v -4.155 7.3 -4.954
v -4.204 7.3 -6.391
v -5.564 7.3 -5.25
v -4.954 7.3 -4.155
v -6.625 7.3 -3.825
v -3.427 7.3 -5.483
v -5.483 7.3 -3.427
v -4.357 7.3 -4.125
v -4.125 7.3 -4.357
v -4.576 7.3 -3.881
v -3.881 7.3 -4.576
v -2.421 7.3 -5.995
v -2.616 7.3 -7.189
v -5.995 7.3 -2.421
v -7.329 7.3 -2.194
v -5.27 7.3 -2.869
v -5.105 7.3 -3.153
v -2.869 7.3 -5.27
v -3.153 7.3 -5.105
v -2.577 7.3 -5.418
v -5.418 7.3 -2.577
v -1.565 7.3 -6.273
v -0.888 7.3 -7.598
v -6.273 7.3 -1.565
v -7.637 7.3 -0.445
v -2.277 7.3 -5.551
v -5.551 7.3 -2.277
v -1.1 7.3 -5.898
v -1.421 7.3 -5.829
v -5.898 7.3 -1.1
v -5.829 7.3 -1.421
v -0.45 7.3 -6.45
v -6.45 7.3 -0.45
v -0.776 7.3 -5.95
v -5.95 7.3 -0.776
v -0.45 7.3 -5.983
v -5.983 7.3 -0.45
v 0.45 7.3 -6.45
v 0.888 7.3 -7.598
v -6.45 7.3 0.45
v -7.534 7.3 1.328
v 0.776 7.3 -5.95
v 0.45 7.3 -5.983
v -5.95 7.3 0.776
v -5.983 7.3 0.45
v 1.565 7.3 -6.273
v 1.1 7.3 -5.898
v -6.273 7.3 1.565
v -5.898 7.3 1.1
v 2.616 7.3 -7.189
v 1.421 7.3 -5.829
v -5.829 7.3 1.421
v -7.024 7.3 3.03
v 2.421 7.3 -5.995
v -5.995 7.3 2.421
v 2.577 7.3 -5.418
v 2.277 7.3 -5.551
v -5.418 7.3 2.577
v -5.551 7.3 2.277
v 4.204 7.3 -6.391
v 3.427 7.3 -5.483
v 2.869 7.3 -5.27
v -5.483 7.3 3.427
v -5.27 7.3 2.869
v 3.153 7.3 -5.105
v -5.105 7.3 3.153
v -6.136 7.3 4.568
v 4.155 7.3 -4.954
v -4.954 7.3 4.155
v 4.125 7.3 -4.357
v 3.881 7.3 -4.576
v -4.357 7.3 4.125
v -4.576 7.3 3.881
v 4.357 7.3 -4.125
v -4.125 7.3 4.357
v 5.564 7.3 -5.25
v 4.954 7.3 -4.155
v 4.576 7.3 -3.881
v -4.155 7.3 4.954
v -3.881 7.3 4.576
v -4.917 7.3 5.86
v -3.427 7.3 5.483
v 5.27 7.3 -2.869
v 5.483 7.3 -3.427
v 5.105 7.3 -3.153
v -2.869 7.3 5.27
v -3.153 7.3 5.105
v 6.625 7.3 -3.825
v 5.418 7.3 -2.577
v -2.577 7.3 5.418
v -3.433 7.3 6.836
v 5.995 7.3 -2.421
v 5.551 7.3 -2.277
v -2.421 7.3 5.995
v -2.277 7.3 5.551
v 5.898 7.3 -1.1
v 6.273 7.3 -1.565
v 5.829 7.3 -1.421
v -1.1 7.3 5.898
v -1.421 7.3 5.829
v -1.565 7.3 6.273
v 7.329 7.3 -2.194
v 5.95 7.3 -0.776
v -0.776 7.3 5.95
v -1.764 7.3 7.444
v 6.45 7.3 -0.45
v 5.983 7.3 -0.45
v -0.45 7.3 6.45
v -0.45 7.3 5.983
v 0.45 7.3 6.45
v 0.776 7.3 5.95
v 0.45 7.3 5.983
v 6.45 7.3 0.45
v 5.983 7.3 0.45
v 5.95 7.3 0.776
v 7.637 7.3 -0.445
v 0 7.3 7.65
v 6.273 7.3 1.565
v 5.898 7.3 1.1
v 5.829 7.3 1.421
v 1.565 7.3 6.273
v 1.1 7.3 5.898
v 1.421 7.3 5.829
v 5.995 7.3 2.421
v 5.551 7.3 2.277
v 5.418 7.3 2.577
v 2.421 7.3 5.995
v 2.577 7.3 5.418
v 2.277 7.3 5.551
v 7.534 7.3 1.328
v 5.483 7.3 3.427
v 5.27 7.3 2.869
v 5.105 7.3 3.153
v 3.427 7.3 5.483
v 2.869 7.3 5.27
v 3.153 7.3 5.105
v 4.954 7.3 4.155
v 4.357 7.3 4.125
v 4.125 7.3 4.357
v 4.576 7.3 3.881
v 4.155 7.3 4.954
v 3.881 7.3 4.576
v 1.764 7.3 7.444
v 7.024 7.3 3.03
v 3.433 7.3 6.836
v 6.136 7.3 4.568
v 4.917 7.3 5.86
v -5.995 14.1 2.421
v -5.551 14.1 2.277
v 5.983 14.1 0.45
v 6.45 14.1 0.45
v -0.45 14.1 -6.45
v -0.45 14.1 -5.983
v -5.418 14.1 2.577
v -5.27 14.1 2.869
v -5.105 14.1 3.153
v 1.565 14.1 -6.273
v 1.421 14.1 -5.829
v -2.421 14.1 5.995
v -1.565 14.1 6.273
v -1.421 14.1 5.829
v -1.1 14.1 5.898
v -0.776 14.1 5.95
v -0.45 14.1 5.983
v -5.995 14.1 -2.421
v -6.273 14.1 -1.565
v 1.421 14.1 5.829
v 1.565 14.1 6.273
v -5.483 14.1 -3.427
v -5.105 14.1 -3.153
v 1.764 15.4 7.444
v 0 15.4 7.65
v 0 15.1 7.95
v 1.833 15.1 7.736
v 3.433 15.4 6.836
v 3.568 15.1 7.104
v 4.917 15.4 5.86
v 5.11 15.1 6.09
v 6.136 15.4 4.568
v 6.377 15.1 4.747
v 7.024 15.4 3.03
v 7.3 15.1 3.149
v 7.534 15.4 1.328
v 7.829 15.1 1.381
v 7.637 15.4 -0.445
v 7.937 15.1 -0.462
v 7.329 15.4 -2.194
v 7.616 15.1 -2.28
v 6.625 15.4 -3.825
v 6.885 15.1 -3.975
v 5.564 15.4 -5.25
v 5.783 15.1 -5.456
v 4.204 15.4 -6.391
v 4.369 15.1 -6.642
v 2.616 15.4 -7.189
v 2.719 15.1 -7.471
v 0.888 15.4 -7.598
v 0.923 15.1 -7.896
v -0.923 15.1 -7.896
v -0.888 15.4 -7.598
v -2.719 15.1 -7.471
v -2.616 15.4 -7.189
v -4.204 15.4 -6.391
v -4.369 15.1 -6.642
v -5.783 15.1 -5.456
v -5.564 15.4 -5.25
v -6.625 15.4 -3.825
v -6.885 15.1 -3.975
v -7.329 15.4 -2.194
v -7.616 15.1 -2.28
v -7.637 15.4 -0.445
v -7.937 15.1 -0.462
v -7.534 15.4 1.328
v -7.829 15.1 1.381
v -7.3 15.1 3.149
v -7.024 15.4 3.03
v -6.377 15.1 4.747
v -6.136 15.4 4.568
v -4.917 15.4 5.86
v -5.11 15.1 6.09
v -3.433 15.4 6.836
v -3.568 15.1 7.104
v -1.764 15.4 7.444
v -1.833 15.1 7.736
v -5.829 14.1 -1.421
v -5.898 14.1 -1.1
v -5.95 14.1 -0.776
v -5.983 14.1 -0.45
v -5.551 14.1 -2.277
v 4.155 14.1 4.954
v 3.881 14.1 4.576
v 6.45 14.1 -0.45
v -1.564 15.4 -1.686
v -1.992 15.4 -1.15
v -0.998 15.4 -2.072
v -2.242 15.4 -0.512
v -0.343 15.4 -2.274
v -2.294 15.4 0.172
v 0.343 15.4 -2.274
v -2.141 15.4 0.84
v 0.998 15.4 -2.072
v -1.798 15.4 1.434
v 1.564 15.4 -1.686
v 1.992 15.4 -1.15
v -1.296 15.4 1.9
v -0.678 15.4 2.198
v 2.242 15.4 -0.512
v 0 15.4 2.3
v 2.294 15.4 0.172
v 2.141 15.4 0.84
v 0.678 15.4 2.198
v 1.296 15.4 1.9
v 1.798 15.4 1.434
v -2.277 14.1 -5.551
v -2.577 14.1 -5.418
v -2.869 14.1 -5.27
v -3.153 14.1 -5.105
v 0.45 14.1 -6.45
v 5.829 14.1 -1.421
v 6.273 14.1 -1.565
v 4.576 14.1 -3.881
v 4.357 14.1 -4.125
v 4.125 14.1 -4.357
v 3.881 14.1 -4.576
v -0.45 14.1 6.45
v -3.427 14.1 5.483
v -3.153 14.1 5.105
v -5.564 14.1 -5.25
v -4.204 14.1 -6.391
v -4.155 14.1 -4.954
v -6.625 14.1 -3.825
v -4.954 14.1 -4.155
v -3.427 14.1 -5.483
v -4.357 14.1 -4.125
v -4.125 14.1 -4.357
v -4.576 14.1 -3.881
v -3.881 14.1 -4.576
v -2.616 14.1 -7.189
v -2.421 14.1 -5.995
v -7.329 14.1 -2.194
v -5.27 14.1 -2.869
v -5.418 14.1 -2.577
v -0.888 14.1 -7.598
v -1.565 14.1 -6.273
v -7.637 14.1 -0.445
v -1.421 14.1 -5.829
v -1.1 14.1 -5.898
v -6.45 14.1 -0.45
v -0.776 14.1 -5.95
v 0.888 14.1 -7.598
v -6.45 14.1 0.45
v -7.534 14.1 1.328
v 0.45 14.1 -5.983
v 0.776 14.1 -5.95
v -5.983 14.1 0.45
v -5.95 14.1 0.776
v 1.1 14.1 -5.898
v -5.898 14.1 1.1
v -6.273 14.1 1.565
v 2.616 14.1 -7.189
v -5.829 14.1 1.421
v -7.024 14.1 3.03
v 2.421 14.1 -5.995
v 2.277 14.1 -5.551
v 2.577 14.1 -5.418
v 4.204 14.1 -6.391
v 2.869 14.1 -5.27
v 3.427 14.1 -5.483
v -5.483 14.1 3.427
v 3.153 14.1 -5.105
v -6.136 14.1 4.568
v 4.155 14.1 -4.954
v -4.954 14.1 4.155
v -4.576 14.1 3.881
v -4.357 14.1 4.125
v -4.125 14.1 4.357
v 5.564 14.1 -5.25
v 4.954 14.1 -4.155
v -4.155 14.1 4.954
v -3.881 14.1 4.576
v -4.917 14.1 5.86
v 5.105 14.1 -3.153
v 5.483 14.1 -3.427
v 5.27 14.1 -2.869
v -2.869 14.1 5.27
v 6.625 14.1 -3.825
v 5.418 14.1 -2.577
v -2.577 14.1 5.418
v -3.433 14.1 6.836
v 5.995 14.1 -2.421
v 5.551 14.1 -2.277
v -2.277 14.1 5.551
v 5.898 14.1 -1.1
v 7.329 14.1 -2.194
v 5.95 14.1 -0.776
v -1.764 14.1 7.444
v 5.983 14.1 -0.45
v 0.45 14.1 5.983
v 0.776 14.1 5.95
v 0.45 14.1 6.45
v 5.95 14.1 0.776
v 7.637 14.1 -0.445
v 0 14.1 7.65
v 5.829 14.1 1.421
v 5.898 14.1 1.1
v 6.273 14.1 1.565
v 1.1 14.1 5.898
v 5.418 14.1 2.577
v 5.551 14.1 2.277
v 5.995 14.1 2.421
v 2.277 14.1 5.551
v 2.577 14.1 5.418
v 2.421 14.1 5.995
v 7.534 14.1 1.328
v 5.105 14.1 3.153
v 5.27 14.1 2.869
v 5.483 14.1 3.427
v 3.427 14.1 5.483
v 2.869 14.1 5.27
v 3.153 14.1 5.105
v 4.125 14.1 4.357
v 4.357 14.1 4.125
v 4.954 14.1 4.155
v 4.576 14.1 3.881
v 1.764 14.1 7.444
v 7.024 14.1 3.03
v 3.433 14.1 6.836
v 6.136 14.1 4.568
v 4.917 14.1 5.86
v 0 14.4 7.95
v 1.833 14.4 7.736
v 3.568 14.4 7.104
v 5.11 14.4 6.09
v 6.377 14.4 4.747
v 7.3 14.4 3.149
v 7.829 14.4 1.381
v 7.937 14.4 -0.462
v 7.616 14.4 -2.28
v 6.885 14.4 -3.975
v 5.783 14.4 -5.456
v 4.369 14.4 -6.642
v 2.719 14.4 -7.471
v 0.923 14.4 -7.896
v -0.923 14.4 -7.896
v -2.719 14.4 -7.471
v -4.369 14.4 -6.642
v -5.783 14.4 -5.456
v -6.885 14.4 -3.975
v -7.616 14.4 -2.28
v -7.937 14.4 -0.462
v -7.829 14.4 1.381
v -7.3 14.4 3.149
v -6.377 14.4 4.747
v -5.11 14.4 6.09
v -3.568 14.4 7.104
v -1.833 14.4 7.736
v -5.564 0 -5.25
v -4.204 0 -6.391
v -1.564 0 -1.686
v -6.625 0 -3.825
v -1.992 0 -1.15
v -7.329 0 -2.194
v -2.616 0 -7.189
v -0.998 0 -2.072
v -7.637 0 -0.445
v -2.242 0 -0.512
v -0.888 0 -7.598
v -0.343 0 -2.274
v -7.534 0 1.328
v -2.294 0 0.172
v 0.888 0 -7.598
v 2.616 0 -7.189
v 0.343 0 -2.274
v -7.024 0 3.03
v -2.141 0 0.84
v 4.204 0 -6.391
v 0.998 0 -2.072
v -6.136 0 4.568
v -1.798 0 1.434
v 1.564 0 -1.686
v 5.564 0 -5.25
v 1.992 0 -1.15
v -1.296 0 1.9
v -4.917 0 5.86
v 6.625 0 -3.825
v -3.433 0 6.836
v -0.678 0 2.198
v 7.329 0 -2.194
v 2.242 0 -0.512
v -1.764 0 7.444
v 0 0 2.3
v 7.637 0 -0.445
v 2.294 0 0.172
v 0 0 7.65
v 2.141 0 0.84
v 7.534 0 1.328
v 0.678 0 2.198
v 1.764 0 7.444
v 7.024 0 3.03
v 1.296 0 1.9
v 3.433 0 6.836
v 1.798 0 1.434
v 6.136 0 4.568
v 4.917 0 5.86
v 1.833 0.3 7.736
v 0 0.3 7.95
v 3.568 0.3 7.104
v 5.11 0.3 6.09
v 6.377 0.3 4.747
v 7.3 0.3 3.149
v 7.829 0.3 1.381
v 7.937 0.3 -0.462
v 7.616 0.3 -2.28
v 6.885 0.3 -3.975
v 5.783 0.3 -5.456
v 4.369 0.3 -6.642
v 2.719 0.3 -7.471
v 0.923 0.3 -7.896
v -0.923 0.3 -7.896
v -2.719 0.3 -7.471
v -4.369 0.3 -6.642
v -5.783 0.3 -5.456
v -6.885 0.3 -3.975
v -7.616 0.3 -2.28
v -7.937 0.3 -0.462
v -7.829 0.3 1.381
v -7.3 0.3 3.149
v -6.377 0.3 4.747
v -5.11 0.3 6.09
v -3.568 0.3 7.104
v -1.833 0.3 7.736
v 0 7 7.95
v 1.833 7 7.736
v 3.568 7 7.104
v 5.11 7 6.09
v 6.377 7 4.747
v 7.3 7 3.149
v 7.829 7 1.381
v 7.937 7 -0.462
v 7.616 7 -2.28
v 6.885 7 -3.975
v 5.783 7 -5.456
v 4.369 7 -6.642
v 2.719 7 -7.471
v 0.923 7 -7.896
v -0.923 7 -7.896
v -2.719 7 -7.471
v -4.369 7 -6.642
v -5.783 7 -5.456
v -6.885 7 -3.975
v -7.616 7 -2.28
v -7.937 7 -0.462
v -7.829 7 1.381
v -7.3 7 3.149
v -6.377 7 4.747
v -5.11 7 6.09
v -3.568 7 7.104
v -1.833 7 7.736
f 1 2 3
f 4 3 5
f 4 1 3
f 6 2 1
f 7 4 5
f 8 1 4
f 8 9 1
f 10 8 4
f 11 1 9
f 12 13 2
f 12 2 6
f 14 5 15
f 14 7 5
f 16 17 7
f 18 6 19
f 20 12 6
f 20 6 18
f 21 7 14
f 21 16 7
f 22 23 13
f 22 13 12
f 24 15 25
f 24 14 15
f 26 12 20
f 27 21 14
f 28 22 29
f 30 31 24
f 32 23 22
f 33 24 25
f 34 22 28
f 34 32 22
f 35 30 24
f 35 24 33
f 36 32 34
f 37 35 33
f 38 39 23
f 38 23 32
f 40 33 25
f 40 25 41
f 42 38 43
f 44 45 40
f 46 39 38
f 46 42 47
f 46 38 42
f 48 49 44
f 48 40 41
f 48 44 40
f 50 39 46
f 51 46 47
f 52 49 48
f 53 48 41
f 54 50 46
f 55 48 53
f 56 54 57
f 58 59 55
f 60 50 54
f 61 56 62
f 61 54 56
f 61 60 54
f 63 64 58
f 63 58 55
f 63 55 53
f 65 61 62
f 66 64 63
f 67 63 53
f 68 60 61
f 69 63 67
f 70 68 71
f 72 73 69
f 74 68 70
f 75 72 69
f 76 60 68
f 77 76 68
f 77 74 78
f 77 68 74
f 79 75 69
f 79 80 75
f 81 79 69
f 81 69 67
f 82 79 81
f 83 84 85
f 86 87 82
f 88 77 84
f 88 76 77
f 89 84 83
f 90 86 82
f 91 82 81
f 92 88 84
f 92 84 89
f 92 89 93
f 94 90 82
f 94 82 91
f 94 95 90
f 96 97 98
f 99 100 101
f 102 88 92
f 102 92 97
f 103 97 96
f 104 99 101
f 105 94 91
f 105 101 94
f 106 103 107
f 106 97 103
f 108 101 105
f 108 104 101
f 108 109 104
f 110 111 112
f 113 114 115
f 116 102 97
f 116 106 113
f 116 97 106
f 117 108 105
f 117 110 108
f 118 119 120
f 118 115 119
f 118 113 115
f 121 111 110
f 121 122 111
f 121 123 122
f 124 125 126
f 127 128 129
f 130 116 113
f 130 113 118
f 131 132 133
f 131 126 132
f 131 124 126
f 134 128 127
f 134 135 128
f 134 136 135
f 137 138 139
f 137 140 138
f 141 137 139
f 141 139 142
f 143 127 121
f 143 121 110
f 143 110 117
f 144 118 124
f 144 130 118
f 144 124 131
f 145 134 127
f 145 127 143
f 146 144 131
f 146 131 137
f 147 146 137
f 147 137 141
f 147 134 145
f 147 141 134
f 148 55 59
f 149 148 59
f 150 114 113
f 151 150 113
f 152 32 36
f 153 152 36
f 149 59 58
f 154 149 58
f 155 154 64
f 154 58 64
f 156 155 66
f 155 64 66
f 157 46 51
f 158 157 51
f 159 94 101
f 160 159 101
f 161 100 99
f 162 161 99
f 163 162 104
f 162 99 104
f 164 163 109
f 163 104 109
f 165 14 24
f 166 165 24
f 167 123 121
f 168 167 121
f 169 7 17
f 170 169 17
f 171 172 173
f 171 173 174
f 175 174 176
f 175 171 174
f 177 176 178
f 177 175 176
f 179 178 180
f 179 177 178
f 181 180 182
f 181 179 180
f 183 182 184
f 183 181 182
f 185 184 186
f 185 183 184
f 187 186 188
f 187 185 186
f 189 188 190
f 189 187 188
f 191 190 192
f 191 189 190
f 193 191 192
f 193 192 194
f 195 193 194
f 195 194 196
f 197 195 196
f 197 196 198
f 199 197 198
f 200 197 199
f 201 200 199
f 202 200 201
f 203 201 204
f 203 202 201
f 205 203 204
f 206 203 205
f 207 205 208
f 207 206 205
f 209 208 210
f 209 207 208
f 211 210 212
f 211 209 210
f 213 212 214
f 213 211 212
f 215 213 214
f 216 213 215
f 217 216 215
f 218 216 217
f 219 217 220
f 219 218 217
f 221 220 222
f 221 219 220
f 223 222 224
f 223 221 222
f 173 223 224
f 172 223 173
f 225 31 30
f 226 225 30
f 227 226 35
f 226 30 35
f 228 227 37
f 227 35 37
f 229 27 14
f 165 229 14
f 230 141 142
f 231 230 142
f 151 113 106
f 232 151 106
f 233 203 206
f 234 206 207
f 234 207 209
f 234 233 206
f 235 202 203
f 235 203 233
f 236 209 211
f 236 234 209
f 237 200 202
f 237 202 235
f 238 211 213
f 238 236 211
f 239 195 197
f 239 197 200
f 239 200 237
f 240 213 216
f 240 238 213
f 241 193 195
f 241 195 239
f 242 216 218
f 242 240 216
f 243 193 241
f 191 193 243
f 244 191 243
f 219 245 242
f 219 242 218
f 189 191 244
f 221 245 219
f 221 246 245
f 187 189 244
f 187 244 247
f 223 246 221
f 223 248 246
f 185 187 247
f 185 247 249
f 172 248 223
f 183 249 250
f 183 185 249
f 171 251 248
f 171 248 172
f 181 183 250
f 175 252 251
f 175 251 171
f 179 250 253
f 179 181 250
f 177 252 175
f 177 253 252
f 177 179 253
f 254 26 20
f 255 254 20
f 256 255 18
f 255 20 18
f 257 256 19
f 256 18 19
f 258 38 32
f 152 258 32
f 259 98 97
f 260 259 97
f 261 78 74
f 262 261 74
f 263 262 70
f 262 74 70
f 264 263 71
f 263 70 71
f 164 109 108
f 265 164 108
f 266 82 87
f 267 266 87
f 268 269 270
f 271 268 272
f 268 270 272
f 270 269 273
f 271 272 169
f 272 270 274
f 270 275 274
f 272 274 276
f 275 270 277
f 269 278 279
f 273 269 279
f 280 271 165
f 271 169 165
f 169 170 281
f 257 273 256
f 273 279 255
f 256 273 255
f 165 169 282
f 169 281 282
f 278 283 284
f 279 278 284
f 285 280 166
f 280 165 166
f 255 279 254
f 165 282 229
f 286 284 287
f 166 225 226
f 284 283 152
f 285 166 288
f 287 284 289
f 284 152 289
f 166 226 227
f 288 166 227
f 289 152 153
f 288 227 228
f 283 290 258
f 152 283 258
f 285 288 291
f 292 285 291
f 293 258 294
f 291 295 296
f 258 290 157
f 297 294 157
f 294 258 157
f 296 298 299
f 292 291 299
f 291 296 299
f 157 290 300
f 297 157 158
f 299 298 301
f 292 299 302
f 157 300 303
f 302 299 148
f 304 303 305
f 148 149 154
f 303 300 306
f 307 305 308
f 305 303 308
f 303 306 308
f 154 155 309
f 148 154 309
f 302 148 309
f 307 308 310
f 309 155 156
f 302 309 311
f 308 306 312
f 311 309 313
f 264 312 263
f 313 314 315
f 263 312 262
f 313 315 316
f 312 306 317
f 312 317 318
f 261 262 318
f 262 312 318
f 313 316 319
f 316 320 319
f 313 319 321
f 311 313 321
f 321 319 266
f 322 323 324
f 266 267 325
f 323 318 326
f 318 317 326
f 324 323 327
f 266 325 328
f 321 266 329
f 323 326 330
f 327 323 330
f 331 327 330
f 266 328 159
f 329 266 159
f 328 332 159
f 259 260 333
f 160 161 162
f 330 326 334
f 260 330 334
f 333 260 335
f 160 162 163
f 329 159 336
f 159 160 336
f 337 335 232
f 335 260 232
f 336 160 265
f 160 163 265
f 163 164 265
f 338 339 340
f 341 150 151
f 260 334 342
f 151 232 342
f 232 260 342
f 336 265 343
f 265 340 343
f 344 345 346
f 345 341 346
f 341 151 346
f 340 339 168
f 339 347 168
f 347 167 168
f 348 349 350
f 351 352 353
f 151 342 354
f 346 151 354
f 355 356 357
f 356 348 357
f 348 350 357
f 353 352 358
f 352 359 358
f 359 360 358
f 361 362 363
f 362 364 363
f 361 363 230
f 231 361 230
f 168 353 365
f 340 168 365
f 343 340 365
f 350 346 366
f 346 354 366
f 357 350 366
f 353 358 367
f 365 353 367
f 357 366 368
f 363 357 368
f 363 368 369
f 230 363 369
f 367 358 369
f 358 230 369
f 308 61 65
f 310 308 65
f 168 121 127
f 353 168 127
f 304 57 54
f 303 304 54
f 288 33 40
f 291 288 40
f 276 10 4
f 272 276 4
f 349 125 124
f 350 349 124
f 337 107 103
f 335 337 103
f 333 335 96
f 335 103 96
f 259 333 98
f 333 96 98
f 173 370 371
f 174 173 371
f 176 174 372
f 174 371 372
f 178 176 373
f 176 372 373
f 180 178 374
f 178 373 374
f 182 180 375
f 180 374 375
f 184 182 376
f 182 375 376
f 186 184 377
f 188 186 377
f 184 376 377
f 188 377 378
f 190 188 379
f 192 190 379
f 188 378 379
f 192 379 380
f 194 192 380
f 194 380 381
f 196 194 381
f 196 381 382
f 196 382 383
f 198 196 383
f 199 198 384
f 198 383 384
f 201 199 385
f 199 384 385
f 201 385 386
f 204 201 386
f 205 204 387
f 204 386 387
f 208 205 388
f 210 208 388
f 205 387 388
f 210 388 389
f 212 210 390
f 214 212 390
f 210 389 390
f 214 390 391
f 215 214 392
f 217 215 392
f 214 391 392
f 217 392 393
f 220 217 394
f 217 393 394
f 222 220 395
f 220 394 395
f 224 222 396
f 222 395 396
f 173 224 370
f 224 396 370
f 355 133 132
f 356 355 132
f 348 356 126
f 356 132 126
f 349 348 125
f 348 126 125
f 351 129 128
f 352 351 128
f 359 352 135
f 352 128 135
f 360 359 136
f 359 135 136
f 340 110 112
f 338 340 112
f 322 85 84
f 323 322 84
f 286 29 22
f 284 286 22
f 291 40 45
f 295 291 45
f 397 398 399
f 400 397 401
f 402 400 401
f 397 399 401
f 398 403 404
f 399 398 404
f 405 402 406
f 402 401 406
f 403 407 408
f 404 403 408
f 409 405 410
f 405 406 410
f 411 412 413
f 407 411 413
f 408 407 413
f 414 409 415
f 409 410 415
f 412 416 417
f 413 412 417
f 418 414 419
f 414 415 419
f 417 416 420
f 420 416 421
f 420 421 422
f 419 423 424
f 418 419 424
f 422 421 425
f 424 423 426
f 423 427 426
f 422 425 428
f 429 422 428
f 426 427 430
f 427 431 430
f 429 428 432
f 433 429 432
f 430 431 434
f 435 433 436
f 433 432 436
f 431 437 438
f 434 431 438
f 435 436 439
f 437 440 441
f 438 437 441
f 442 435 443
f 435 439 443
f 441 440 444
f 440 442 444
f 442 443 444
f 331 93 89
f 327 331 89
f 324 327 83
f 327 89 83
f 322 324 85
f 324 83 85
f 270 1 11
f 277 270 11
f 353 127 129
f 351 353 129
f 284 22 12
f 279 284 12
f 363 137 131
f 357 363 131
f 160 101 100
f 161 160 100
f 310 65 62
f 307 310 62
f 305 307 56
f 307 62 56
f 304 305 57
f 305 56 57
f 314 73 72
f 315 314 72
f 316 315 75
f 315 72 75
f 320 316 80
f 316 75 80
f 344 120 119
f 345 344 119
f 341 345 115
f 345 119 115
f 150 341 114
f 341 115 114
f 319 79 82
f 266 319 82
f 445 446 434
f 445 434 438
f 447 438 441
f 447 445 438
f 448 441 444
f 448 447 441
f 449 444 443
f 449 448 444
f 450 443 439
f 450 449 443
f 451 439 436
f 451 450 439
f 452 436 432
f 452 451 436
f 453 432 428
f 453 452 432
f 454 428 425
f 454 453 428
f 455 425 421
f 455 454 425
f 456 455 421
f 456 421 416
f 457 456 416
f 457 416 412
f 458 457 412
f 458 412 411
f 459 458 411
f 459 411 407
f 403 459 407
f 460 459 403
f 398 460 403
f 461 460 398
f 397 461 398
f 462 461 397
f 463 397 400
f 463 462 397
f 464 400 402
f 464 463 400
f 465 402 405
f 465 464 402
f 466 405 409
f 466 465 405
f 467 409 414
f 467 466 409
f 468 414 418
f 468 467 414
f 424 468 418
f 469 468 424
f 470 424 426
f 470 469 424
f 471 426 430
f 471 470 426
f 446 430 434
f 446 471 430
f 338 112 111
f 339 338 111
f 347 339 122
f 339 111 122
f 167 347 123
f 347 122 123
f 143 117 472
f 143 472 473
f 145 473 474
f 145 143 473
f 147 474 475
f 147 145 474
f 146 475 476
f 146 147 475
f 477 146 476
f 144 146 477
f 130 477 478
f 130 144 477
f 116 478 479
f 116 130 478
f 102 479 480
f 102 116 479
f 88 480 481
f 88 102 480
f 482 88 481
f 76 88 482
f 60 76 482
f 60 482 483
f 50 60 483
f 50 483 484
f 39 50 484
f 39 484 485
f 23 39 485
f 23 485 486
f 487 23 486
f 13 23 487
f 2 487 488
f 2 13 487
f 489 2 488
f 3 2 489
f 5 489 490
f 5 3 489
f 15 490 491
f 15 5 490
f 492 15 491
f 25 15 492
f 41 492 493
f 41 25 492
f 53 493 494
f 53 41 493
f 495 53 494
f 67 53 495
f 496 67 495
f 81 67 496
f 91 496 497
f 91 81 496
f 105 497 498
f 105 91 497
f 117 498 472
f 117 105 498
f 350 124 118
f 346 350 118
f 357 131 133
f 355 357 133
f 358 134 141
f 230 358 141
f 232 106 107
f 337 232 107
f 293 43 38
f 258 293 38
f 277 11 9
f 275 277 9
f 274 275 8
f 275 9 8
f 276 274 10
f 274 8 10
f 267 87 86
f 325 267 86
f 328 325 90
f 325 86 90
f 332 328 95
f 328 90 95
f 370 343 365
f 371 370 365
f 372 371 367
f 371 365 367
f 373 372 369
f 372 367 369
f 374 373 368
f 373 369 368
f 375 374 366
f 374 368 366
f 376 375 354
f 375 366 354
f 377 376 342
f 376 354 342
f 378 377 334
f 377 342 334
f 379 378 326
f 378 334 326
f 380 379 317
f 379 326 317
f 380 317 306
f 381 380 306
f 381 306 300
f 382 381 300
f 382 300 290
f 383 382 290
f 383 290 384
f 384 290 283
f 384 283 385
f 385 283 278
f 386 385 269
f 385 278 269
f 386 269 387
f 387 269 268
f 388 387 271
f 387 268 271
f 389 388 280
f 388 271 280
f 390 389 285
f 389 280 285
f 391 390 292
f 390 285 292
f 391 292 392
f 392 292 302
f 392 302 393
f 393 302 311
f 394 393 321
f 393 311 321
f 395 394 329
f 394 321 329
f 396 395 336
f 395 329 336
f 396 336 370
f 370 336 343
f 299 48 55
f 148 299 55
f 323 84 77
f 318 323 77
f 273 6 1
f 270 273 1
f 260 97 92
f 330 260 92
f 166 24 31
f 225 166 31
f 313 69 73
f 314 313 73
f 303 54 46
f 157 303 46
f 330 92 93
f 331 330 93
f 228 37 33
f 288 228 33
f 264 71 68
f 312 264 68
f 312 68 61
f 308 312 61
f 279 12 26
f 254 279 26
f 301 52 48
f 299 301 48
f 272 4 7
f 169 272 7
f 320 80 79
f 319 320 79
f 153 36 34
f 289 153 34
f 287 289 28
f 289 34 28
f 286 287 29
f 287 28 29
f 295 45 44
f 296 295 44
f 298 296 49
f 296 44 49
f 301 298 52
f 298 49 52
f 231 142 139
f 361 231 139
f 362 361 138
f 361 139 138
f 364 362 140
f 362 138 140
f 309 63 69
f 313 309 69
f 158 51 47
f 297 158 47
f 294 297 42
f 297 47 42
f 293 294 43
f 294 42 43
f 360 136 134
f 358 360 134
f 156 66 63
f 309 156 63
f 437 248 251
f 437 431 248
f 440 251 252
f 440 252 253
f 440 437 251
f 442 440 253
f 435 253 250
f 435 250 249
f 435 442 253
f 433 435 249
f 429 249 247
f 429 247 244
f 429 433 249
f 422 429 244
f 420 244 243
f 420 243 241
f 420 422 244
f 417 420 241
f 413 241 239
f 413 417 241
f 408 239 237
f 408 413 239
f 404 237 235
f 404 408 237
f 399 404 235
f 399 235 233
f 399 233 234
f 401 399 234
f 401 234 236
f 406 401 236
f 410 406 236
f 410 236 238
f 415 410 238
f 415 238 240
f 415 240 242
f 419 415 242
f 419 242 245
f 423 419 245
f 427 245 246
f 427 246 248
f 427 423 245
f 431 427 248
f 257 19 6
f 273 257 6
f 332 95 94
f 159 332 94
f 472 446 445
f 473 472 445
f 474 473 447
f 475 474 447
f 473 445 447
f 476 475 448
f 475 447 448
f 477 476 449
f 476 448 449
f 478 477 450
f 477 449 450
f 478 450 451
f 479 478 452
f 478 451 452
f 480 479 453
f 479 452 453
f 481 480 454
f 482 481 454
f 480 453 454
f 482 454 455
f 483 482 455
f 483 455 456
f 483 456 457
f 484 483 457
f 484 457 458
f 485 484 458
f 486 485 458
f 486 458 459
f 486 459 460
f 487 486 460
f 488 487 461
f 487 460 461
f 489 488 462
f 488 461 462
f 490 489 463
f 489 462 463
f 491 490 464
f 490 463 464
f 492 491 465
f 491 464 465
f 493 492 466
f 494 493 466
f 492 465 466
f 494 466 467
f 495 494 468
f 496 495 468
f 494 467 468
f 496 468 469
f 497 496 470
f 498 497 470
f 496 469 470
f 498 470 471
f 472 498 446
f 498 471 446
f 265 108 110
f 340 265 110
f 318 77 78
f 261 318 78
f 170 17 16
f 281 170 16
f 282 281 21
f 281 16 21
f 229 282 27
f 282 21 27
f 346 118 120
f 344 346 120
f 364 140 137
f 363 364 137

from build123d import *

# Parameters (mm, degrees)
SKETCH1_R           = 7.95
SKETCH1_R_2         = 2.3
BOSS_EXTRUDE1_DEPTH = 7.3
SKETCH2_R           = 2.3
BOSS_EXTRUDE2_DEPTH = 6.8
SKETCH3_R           = 7.95
SKETCH3_R_2         = 2.3
BOSS_EXTRUDE3_DEPTH = 1.3
CHAMFER1_SIZE       = 0.3


with BuildPart() as part:
    # Sketch1 → Boss-Extrude1 (new body)
    with BuildSketch(Plane(origin=(0, 0, 0), x_dir=(1, 0, 0), z_dir=(0, 1, 0))):
        with Locations(Location((0, 0, 0), (0, 0, 270))):
            Circle(SKETCH1_R)
        with Locations(Location((0, 0, 0), (0, 0, 270))):
            Circle(SKETCH1_R_2, mode=Mode.SUBTRACT)
    extrude(amount=BOSS_EXTRUDE1_DEPTH)

    # Sketch2 → Boss-Extrude2 (add)
    with BuildSketch(Plane(origin=(0, 7.3, 0), x_dir=(1, 0, 0), z_dir=(0, 1, 0))):
        with BuildLine():
            Line((1.565184181, 6.273372178), (1.420904518, 5.829325034))
            ThreePointArc((1.420904518, 5.829325034), (0.93860679, 5.926130044), (0.45, 5.983101203))
            Line((0.45, 5.983101203), (0.45, 6.45))
            Line((0.45, 6.45), (-0.45, 6.45))
            Line((-0.45, 6.45), (-0.45, 5.983101203))
            ThreePointArc((-0.45, 5.983101203), (-0.93860679, 5.926130044), (-1.420904518, 5.829325034))
            Line((-1.420904518, 5.829325034), (-1.565184181, 6.273372178))
            Line((-1.565184181, 6.273372178), (-2.421135046, 5.995256883))
            Line((-2.421135046, 5.995256883), (-2.276855383, 5.551209739))
            ThreePointArc((-2.276855383, 5.551209739), (-2.723942998, 5.346039145), (-3.152721002, 5.104933915))
            Line((-3.152721002, 5.104933915), (-3.42715723, 5.482662977))
            Line((-3.42715723, 5.482662977), (-4.155272525, 4.95365625))
            Line((-4.155272525, 4.95365625), (-3.880836297, 4.575927188))
            ThreePointArc((-3.880836297, 4.575927188), (-4.242640687, 4.242640687), (-4.575927188, 3.880836297))
            Line((-4.575927188, 3.880836297), (-4.95365625, 4.155272525))
            Line((-4.95365625, 4.155272525), (-5.482662977, 3.42715723))
            Line((-5.482662977, 3.42715723), (-5.104933915, 3.152721002))
            ThreePointArc((-5.104933915, 3.152721002), (-5.346039145, 2.723942998), (-5.551209739, 2.276855383))
            Line((-5.551209739, 2.276855383), (-5.995256883, 2.421135046))
            Line((-5.995256883, 2.421135046), (-6.273372178, 1.565184181))
            Line((-6.273372178, 1.565184181), (-5.829325034, 1.420904518))
            ThreePointArc((-5.829325034, 1.420904518), (-5.926130044, 0.93860679), (-5.983101203, 0.45))
            Line((-5.983101203, 0.45), (-6.45, 0.45))
            Line((-6.45, 0.45), (-6.45, -0.45))
            Line((-6.45, -0.45), (-5.983101203, -0.45))
            ThreePointArc((-5.983101203, -0.45), (-5.926130044, -0.93860679), (-5.829325034, -1.420904518))
            Line((-5.829325034, -1.420904518), (-6.273372178, -1.565184181))
            Line((-6.273372178, -1.565184181), (-5.995256883, -2.421135046))
            Line((-5.995256883, -2.421135046), (-5.551209739, -2.276855383))
            ThreePointArc((-5.551209739, -2.276855383), (-5.346039145, -2.723942998), (-5.104933915, -3.152721002))
            Line((-5.104933915, -3.152721002), (-5.482662977, -3.42715723))
            Line((-5.482662977, -3.42715723), (-4.95365625, -4.155272525))
            Line((-4.95365625, -4.155272525), (-4.575927188, -3.880836297))
            ThreePointArc((-4.575927188, -3.880836297), (-4.242640687, -4.242640687), (-3.880836297, -4.575927188))
            Line((-3.880836297, -4.575927188), (-4.155272525, -4.95365625))
            Line((-4.155272525, -4.95365625), (-3.42715723, -5.482662977))
            Line((-3.42715723, -5.482662977), (-3.152721002, -5.104933915))
            ThreePointArc((-3.152721002, -5.104933915), (-2.723942998, -5.346039145), (-2.276855383, -5.551209739))
            Line((-2.276855383, -5.551209739), (-2.421135046, -5.995256883))
            Line((-2.421135046, -5.995256883), (-1.565184181, -6.273372178))
            Line((-1.565184181, -6.273372178), (-1.420904518, -5.829325034))
            ThreePointArc((-1.420904518, -5.829325034), (-0.93860679, -5.926130044), (-0.45, -5.983101203))
            Line((-0.45, -5.983101203), (-0.45, -6.45))
            Line((-0.45, -6.45), (0.45, -6.45))
            Line((0.45, -6.45), (0.45, -5.983101203))
            ThreePointArc((0.45, -5.983101203), (0.93860679, -5.926130044), (1.420904518, -5.829325034))
            Line((1.420904518, -5.829325034), (1.565184181, -6.273372178))
            Line((1.565184181, -6.273372178), (2.421135046, -5.995256883))
            Line((2.421135046, -5.995256883), (2.276855383, -5.551209739))
            ThreePointArc((2.276855383, -5.551209739), (2.723942998, -5.346039145), (3.152721002, -5.104933915))
            Line((3.152721002, -5.104933915), (3.42715723, -5.482662977))
            Line((3.42715723, -5.482662977), (4.155272525, -4.95365625))
            Line((4.155272525, -4.95365625), (3.880836297, -4.575927188))
            ThreePointArc((3.880836297, -4.575927188), (4.242640687, -4.242640687), (4.575927188, -3.880836297))
            Line((4.575927188, -3.880836297), (4.95365625, -4.155272525))
            Line((4.95365625, -4.155272525), (5.482662977, -3.42715723))
            Line((5.482662977, -3.42715723), (5.104933915, -3.152721002))
            ThreePointArc((5.104933915, -3.152721002), (5.346039145, -2.723942998), (5.551209739, -2.276855383))
            Line((5.551209739, -2.276855383), (5.995256883, -2.421135046))
            Line((5.995256883, -2.421135046), (6.273372178, -1.565184181))
            Line((6.273372178, -1.565184181), (5.829325034, -1.420904518))
            ThreePointArc((5.829325034, -1.420904518), (5.926130044, -0.93860679), (5.983101203, -0.45))
            Line((5.983101203, -0.45), (6.45, -0.45))
            Line((6.45, -0.45), (6.45, 0.45))
            Line((6.45, 0.45), (5.983101203, 0.45))
            ThreePointArc((5.983101203, 0.45), (5.926130044, 0.93860679), (5.829325034, 1.420904518))
            Line((5.829325034, 1.420904518), (6.273372178, 1.565184181))
            Line((6.273372178, 1.565184181), (5.995256883, 2.421135046))
            Line((5.995256883, 2.421135046), (5.551209739, 2.276855383))
            ThreePointArc((5.551209739, 2.276855383), (5.346039145, 2.723942998), (5.104933915, 3.152721002))
            Line((5.104933915, 3.152721002), (5.482662977, 3.42715723))
            Line((5.482662977, 3.42715723), (4.95365625, 4.155272525))
            Line((4.95365625, 4.155272525), (4.575927188, 3.880836297))
            ThreePointArc((4.575927188, 3.880836297), (4.242640687, 4.242640687), (3.880836297, 4.575927188))
            Line((3.880836297, 4.575927188), (4.155272525, 4.95365625))
            Line((4.155272525, 4.95365625), (3.42715723, 5.482662977))
            Line((3.42715723, 5.482662977), (3.152721002, 5.104933915))
            ThreePointArc((3.152721002, 5.104933915), (2.723942998, 5.346039145), (2.276855383, 5.551209739))
            Line((2.276855383, 5.551209739), (2.421135046, 5.995256883))
            Line((2.421135046, 5.995256883), (1.565184181, 6.273372178))
        make_face()
        with Locations(Location((0, 0, 0), (0, 0, 270))):
            Circle(SKETCH2_R, mode=Mode.SUBTRACT)
    extrude(amount=BOSS_EXTRUDE2_DEPTH)

    # Sketch3 → Boss-Extrude3 (add)
    with BuildSketch(Plane(origin=(0, 14.1, 0), x_dir=(1, 0, 0), z_dir=(0, 1, 0))):
        with Locations(Location((0, 0, 0), (0, 0, 270))):
            Circle(SKETCH3_R)
        with Locations(Location((0, 0, 0), (0, 0, 270))):
            Circle(SKETCH3_R_2, mode=Mode.SUBTRACT)
    extrude(amount=BOSS_EXTRUDE3_DEPTH)

    # Chamfer1
    chamfer1_edges = [part.edges().sort_by_distance(p)[0] for p in [
        (0, 0, -7.95),
        (0, 15.4, -7.95),
        (0, 14.1, -7.95),
        (0, 7.3, -7.95),
    ]]
    chamfer(chamfer1_edges, length=CHAMFER1_SIZE)


solid = part.part
